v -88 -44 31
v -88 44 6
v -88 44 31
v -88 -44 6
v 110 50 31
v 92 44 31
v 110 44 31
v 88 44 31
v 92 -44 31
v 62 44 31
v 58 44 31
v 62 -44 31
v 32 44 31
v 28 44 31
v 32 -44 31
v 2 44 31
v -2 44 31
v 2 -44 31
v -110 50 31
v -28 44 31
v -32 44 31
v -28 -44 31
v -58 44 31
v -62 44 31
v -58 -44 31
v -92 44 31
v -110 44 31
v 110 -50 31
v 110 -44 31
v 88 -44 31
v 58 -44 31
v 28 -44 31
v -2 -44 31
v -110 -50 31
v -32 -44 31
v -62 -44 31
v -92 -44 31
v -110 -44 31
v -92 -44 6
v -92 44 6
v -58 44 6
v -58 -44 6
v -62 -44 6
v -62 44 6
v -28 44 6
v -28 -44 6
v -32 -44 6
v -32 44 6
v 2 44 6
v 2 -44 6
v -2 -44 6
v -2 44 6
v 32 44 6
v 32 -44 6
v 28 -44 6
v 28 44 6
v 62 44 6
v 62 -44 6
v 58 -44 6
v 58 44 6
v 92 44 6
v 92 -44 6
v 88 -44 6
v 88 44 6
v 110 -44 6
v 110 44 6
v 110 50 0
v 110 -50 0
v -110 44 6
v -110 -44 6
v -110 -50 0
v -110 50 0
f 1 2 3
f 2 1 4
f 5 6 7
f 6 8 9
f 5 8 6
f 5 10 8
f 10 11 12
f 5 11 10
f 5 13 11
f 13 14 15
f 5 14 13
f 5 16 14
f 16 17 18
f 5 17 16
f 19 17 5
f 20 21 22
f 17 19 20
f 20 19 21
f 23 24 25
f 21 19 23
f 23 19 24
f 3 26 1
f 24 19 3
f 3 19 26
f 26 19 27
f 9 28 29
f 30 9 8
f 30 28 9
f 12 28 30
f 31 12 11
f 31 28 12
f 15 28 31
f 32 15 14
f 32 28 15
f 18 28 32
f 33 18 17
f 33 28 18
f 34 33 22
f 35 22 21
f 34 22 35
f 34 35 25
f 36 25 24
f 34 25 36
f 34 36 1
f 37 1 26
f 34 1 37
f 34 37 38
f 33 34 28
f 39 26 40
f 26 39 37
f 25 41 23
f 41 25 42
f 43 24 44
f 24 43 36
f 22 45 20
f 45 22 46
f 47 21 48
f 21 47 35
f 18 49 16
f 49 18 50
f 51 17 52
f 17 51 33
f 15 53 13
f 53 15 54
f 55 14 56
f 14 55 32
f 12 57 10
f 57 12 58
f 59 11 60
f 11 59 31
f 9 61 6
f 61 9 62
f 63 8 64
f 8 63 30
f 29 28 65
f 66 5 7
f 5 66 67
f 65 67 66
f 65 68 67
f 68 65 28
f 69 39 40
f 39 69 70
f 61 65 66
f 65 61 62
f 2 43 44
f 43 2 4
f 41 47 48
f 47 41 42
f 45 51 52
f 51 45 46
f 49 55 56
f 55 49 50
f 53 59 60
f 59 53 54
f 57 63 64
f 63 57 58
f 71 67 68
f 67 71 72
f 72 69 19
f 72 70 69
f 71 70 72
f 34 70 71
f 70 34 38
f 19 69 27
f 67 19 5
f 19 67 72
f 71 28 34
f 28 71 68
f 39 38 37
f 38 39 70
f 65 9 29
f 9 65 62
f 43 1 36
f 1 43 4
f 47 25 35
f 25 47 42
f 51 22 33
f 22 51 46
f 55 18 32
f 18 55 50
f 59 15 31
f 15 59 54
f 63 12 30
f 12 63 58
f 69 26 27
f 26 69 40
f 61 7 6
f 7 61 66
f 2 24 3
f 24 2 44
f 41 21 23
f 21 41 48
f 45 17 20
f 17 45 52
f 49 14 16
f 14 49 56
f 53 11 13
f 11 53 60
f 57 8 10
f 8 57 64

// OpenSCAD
$fn = 32;

// ----------------------------------------------------------------------
// Rib frame 220 x 100 x 31
// 7 ribs at 30 mm pitch
// ----------------------------------------------------------------------

// --- parameters (mm) ---
frame = [220, 100, 6];  // base plate size (x, y, z)
rail_w = 6;             // side rail width
ribs = 7;               // number of ribs
rib_t = 4;              // rib thickness
rib_h = 25;             // rib height above the base plate
pitch = 30;             // pitch between rib centres

// --- derived feature positions (mm) ---
span = (ribs - 1) * pitch;          // = 180   distance between the outer ribs
origin_x = -span / 2;               // = -90   X of the first rib
rib_len = frame[1] - 2 * rail_w + 2;  // = 90   rib length, 1 mm into each rail
feature_centers = [
  [origin_x + 0 * pitch, 0],
  [origin_x + 1 * pitch, 0],
  [origin_x + 2 * pitch, 0],
  [origin_x + 3 * pitch, 0],
  [origin_x + 4 * pitch, 0],
  [origin_x + 5 * pitch, 0],
  [origin_x + 6 * pitch, 0]
];   // rib centre line, drives the rib loop

// base plate, two side rails, then the ribs read straight off feature_centers
union() {
  translate([-frame[0] / 2, -frame[1] / 2, 0]) cube(frame);
  translate([-frame[0] / 2, -frame[1] / 2, 0]) cube([frame[0], rail_w, frame[2] + rib_h]);
  translate([-frame[0] / 2, frame[1] / 2 - rail_w, 0]) cube([frame[0], rail_w, frame[2] + rib_h]);
  for (centre = feature_centers)
    translate([centre[0] - rib_t / 2, centre[1] - rib_len / 2, frame[2] - 1])
      cube([rib_t, rib_len, rib_h + 1]);
}
